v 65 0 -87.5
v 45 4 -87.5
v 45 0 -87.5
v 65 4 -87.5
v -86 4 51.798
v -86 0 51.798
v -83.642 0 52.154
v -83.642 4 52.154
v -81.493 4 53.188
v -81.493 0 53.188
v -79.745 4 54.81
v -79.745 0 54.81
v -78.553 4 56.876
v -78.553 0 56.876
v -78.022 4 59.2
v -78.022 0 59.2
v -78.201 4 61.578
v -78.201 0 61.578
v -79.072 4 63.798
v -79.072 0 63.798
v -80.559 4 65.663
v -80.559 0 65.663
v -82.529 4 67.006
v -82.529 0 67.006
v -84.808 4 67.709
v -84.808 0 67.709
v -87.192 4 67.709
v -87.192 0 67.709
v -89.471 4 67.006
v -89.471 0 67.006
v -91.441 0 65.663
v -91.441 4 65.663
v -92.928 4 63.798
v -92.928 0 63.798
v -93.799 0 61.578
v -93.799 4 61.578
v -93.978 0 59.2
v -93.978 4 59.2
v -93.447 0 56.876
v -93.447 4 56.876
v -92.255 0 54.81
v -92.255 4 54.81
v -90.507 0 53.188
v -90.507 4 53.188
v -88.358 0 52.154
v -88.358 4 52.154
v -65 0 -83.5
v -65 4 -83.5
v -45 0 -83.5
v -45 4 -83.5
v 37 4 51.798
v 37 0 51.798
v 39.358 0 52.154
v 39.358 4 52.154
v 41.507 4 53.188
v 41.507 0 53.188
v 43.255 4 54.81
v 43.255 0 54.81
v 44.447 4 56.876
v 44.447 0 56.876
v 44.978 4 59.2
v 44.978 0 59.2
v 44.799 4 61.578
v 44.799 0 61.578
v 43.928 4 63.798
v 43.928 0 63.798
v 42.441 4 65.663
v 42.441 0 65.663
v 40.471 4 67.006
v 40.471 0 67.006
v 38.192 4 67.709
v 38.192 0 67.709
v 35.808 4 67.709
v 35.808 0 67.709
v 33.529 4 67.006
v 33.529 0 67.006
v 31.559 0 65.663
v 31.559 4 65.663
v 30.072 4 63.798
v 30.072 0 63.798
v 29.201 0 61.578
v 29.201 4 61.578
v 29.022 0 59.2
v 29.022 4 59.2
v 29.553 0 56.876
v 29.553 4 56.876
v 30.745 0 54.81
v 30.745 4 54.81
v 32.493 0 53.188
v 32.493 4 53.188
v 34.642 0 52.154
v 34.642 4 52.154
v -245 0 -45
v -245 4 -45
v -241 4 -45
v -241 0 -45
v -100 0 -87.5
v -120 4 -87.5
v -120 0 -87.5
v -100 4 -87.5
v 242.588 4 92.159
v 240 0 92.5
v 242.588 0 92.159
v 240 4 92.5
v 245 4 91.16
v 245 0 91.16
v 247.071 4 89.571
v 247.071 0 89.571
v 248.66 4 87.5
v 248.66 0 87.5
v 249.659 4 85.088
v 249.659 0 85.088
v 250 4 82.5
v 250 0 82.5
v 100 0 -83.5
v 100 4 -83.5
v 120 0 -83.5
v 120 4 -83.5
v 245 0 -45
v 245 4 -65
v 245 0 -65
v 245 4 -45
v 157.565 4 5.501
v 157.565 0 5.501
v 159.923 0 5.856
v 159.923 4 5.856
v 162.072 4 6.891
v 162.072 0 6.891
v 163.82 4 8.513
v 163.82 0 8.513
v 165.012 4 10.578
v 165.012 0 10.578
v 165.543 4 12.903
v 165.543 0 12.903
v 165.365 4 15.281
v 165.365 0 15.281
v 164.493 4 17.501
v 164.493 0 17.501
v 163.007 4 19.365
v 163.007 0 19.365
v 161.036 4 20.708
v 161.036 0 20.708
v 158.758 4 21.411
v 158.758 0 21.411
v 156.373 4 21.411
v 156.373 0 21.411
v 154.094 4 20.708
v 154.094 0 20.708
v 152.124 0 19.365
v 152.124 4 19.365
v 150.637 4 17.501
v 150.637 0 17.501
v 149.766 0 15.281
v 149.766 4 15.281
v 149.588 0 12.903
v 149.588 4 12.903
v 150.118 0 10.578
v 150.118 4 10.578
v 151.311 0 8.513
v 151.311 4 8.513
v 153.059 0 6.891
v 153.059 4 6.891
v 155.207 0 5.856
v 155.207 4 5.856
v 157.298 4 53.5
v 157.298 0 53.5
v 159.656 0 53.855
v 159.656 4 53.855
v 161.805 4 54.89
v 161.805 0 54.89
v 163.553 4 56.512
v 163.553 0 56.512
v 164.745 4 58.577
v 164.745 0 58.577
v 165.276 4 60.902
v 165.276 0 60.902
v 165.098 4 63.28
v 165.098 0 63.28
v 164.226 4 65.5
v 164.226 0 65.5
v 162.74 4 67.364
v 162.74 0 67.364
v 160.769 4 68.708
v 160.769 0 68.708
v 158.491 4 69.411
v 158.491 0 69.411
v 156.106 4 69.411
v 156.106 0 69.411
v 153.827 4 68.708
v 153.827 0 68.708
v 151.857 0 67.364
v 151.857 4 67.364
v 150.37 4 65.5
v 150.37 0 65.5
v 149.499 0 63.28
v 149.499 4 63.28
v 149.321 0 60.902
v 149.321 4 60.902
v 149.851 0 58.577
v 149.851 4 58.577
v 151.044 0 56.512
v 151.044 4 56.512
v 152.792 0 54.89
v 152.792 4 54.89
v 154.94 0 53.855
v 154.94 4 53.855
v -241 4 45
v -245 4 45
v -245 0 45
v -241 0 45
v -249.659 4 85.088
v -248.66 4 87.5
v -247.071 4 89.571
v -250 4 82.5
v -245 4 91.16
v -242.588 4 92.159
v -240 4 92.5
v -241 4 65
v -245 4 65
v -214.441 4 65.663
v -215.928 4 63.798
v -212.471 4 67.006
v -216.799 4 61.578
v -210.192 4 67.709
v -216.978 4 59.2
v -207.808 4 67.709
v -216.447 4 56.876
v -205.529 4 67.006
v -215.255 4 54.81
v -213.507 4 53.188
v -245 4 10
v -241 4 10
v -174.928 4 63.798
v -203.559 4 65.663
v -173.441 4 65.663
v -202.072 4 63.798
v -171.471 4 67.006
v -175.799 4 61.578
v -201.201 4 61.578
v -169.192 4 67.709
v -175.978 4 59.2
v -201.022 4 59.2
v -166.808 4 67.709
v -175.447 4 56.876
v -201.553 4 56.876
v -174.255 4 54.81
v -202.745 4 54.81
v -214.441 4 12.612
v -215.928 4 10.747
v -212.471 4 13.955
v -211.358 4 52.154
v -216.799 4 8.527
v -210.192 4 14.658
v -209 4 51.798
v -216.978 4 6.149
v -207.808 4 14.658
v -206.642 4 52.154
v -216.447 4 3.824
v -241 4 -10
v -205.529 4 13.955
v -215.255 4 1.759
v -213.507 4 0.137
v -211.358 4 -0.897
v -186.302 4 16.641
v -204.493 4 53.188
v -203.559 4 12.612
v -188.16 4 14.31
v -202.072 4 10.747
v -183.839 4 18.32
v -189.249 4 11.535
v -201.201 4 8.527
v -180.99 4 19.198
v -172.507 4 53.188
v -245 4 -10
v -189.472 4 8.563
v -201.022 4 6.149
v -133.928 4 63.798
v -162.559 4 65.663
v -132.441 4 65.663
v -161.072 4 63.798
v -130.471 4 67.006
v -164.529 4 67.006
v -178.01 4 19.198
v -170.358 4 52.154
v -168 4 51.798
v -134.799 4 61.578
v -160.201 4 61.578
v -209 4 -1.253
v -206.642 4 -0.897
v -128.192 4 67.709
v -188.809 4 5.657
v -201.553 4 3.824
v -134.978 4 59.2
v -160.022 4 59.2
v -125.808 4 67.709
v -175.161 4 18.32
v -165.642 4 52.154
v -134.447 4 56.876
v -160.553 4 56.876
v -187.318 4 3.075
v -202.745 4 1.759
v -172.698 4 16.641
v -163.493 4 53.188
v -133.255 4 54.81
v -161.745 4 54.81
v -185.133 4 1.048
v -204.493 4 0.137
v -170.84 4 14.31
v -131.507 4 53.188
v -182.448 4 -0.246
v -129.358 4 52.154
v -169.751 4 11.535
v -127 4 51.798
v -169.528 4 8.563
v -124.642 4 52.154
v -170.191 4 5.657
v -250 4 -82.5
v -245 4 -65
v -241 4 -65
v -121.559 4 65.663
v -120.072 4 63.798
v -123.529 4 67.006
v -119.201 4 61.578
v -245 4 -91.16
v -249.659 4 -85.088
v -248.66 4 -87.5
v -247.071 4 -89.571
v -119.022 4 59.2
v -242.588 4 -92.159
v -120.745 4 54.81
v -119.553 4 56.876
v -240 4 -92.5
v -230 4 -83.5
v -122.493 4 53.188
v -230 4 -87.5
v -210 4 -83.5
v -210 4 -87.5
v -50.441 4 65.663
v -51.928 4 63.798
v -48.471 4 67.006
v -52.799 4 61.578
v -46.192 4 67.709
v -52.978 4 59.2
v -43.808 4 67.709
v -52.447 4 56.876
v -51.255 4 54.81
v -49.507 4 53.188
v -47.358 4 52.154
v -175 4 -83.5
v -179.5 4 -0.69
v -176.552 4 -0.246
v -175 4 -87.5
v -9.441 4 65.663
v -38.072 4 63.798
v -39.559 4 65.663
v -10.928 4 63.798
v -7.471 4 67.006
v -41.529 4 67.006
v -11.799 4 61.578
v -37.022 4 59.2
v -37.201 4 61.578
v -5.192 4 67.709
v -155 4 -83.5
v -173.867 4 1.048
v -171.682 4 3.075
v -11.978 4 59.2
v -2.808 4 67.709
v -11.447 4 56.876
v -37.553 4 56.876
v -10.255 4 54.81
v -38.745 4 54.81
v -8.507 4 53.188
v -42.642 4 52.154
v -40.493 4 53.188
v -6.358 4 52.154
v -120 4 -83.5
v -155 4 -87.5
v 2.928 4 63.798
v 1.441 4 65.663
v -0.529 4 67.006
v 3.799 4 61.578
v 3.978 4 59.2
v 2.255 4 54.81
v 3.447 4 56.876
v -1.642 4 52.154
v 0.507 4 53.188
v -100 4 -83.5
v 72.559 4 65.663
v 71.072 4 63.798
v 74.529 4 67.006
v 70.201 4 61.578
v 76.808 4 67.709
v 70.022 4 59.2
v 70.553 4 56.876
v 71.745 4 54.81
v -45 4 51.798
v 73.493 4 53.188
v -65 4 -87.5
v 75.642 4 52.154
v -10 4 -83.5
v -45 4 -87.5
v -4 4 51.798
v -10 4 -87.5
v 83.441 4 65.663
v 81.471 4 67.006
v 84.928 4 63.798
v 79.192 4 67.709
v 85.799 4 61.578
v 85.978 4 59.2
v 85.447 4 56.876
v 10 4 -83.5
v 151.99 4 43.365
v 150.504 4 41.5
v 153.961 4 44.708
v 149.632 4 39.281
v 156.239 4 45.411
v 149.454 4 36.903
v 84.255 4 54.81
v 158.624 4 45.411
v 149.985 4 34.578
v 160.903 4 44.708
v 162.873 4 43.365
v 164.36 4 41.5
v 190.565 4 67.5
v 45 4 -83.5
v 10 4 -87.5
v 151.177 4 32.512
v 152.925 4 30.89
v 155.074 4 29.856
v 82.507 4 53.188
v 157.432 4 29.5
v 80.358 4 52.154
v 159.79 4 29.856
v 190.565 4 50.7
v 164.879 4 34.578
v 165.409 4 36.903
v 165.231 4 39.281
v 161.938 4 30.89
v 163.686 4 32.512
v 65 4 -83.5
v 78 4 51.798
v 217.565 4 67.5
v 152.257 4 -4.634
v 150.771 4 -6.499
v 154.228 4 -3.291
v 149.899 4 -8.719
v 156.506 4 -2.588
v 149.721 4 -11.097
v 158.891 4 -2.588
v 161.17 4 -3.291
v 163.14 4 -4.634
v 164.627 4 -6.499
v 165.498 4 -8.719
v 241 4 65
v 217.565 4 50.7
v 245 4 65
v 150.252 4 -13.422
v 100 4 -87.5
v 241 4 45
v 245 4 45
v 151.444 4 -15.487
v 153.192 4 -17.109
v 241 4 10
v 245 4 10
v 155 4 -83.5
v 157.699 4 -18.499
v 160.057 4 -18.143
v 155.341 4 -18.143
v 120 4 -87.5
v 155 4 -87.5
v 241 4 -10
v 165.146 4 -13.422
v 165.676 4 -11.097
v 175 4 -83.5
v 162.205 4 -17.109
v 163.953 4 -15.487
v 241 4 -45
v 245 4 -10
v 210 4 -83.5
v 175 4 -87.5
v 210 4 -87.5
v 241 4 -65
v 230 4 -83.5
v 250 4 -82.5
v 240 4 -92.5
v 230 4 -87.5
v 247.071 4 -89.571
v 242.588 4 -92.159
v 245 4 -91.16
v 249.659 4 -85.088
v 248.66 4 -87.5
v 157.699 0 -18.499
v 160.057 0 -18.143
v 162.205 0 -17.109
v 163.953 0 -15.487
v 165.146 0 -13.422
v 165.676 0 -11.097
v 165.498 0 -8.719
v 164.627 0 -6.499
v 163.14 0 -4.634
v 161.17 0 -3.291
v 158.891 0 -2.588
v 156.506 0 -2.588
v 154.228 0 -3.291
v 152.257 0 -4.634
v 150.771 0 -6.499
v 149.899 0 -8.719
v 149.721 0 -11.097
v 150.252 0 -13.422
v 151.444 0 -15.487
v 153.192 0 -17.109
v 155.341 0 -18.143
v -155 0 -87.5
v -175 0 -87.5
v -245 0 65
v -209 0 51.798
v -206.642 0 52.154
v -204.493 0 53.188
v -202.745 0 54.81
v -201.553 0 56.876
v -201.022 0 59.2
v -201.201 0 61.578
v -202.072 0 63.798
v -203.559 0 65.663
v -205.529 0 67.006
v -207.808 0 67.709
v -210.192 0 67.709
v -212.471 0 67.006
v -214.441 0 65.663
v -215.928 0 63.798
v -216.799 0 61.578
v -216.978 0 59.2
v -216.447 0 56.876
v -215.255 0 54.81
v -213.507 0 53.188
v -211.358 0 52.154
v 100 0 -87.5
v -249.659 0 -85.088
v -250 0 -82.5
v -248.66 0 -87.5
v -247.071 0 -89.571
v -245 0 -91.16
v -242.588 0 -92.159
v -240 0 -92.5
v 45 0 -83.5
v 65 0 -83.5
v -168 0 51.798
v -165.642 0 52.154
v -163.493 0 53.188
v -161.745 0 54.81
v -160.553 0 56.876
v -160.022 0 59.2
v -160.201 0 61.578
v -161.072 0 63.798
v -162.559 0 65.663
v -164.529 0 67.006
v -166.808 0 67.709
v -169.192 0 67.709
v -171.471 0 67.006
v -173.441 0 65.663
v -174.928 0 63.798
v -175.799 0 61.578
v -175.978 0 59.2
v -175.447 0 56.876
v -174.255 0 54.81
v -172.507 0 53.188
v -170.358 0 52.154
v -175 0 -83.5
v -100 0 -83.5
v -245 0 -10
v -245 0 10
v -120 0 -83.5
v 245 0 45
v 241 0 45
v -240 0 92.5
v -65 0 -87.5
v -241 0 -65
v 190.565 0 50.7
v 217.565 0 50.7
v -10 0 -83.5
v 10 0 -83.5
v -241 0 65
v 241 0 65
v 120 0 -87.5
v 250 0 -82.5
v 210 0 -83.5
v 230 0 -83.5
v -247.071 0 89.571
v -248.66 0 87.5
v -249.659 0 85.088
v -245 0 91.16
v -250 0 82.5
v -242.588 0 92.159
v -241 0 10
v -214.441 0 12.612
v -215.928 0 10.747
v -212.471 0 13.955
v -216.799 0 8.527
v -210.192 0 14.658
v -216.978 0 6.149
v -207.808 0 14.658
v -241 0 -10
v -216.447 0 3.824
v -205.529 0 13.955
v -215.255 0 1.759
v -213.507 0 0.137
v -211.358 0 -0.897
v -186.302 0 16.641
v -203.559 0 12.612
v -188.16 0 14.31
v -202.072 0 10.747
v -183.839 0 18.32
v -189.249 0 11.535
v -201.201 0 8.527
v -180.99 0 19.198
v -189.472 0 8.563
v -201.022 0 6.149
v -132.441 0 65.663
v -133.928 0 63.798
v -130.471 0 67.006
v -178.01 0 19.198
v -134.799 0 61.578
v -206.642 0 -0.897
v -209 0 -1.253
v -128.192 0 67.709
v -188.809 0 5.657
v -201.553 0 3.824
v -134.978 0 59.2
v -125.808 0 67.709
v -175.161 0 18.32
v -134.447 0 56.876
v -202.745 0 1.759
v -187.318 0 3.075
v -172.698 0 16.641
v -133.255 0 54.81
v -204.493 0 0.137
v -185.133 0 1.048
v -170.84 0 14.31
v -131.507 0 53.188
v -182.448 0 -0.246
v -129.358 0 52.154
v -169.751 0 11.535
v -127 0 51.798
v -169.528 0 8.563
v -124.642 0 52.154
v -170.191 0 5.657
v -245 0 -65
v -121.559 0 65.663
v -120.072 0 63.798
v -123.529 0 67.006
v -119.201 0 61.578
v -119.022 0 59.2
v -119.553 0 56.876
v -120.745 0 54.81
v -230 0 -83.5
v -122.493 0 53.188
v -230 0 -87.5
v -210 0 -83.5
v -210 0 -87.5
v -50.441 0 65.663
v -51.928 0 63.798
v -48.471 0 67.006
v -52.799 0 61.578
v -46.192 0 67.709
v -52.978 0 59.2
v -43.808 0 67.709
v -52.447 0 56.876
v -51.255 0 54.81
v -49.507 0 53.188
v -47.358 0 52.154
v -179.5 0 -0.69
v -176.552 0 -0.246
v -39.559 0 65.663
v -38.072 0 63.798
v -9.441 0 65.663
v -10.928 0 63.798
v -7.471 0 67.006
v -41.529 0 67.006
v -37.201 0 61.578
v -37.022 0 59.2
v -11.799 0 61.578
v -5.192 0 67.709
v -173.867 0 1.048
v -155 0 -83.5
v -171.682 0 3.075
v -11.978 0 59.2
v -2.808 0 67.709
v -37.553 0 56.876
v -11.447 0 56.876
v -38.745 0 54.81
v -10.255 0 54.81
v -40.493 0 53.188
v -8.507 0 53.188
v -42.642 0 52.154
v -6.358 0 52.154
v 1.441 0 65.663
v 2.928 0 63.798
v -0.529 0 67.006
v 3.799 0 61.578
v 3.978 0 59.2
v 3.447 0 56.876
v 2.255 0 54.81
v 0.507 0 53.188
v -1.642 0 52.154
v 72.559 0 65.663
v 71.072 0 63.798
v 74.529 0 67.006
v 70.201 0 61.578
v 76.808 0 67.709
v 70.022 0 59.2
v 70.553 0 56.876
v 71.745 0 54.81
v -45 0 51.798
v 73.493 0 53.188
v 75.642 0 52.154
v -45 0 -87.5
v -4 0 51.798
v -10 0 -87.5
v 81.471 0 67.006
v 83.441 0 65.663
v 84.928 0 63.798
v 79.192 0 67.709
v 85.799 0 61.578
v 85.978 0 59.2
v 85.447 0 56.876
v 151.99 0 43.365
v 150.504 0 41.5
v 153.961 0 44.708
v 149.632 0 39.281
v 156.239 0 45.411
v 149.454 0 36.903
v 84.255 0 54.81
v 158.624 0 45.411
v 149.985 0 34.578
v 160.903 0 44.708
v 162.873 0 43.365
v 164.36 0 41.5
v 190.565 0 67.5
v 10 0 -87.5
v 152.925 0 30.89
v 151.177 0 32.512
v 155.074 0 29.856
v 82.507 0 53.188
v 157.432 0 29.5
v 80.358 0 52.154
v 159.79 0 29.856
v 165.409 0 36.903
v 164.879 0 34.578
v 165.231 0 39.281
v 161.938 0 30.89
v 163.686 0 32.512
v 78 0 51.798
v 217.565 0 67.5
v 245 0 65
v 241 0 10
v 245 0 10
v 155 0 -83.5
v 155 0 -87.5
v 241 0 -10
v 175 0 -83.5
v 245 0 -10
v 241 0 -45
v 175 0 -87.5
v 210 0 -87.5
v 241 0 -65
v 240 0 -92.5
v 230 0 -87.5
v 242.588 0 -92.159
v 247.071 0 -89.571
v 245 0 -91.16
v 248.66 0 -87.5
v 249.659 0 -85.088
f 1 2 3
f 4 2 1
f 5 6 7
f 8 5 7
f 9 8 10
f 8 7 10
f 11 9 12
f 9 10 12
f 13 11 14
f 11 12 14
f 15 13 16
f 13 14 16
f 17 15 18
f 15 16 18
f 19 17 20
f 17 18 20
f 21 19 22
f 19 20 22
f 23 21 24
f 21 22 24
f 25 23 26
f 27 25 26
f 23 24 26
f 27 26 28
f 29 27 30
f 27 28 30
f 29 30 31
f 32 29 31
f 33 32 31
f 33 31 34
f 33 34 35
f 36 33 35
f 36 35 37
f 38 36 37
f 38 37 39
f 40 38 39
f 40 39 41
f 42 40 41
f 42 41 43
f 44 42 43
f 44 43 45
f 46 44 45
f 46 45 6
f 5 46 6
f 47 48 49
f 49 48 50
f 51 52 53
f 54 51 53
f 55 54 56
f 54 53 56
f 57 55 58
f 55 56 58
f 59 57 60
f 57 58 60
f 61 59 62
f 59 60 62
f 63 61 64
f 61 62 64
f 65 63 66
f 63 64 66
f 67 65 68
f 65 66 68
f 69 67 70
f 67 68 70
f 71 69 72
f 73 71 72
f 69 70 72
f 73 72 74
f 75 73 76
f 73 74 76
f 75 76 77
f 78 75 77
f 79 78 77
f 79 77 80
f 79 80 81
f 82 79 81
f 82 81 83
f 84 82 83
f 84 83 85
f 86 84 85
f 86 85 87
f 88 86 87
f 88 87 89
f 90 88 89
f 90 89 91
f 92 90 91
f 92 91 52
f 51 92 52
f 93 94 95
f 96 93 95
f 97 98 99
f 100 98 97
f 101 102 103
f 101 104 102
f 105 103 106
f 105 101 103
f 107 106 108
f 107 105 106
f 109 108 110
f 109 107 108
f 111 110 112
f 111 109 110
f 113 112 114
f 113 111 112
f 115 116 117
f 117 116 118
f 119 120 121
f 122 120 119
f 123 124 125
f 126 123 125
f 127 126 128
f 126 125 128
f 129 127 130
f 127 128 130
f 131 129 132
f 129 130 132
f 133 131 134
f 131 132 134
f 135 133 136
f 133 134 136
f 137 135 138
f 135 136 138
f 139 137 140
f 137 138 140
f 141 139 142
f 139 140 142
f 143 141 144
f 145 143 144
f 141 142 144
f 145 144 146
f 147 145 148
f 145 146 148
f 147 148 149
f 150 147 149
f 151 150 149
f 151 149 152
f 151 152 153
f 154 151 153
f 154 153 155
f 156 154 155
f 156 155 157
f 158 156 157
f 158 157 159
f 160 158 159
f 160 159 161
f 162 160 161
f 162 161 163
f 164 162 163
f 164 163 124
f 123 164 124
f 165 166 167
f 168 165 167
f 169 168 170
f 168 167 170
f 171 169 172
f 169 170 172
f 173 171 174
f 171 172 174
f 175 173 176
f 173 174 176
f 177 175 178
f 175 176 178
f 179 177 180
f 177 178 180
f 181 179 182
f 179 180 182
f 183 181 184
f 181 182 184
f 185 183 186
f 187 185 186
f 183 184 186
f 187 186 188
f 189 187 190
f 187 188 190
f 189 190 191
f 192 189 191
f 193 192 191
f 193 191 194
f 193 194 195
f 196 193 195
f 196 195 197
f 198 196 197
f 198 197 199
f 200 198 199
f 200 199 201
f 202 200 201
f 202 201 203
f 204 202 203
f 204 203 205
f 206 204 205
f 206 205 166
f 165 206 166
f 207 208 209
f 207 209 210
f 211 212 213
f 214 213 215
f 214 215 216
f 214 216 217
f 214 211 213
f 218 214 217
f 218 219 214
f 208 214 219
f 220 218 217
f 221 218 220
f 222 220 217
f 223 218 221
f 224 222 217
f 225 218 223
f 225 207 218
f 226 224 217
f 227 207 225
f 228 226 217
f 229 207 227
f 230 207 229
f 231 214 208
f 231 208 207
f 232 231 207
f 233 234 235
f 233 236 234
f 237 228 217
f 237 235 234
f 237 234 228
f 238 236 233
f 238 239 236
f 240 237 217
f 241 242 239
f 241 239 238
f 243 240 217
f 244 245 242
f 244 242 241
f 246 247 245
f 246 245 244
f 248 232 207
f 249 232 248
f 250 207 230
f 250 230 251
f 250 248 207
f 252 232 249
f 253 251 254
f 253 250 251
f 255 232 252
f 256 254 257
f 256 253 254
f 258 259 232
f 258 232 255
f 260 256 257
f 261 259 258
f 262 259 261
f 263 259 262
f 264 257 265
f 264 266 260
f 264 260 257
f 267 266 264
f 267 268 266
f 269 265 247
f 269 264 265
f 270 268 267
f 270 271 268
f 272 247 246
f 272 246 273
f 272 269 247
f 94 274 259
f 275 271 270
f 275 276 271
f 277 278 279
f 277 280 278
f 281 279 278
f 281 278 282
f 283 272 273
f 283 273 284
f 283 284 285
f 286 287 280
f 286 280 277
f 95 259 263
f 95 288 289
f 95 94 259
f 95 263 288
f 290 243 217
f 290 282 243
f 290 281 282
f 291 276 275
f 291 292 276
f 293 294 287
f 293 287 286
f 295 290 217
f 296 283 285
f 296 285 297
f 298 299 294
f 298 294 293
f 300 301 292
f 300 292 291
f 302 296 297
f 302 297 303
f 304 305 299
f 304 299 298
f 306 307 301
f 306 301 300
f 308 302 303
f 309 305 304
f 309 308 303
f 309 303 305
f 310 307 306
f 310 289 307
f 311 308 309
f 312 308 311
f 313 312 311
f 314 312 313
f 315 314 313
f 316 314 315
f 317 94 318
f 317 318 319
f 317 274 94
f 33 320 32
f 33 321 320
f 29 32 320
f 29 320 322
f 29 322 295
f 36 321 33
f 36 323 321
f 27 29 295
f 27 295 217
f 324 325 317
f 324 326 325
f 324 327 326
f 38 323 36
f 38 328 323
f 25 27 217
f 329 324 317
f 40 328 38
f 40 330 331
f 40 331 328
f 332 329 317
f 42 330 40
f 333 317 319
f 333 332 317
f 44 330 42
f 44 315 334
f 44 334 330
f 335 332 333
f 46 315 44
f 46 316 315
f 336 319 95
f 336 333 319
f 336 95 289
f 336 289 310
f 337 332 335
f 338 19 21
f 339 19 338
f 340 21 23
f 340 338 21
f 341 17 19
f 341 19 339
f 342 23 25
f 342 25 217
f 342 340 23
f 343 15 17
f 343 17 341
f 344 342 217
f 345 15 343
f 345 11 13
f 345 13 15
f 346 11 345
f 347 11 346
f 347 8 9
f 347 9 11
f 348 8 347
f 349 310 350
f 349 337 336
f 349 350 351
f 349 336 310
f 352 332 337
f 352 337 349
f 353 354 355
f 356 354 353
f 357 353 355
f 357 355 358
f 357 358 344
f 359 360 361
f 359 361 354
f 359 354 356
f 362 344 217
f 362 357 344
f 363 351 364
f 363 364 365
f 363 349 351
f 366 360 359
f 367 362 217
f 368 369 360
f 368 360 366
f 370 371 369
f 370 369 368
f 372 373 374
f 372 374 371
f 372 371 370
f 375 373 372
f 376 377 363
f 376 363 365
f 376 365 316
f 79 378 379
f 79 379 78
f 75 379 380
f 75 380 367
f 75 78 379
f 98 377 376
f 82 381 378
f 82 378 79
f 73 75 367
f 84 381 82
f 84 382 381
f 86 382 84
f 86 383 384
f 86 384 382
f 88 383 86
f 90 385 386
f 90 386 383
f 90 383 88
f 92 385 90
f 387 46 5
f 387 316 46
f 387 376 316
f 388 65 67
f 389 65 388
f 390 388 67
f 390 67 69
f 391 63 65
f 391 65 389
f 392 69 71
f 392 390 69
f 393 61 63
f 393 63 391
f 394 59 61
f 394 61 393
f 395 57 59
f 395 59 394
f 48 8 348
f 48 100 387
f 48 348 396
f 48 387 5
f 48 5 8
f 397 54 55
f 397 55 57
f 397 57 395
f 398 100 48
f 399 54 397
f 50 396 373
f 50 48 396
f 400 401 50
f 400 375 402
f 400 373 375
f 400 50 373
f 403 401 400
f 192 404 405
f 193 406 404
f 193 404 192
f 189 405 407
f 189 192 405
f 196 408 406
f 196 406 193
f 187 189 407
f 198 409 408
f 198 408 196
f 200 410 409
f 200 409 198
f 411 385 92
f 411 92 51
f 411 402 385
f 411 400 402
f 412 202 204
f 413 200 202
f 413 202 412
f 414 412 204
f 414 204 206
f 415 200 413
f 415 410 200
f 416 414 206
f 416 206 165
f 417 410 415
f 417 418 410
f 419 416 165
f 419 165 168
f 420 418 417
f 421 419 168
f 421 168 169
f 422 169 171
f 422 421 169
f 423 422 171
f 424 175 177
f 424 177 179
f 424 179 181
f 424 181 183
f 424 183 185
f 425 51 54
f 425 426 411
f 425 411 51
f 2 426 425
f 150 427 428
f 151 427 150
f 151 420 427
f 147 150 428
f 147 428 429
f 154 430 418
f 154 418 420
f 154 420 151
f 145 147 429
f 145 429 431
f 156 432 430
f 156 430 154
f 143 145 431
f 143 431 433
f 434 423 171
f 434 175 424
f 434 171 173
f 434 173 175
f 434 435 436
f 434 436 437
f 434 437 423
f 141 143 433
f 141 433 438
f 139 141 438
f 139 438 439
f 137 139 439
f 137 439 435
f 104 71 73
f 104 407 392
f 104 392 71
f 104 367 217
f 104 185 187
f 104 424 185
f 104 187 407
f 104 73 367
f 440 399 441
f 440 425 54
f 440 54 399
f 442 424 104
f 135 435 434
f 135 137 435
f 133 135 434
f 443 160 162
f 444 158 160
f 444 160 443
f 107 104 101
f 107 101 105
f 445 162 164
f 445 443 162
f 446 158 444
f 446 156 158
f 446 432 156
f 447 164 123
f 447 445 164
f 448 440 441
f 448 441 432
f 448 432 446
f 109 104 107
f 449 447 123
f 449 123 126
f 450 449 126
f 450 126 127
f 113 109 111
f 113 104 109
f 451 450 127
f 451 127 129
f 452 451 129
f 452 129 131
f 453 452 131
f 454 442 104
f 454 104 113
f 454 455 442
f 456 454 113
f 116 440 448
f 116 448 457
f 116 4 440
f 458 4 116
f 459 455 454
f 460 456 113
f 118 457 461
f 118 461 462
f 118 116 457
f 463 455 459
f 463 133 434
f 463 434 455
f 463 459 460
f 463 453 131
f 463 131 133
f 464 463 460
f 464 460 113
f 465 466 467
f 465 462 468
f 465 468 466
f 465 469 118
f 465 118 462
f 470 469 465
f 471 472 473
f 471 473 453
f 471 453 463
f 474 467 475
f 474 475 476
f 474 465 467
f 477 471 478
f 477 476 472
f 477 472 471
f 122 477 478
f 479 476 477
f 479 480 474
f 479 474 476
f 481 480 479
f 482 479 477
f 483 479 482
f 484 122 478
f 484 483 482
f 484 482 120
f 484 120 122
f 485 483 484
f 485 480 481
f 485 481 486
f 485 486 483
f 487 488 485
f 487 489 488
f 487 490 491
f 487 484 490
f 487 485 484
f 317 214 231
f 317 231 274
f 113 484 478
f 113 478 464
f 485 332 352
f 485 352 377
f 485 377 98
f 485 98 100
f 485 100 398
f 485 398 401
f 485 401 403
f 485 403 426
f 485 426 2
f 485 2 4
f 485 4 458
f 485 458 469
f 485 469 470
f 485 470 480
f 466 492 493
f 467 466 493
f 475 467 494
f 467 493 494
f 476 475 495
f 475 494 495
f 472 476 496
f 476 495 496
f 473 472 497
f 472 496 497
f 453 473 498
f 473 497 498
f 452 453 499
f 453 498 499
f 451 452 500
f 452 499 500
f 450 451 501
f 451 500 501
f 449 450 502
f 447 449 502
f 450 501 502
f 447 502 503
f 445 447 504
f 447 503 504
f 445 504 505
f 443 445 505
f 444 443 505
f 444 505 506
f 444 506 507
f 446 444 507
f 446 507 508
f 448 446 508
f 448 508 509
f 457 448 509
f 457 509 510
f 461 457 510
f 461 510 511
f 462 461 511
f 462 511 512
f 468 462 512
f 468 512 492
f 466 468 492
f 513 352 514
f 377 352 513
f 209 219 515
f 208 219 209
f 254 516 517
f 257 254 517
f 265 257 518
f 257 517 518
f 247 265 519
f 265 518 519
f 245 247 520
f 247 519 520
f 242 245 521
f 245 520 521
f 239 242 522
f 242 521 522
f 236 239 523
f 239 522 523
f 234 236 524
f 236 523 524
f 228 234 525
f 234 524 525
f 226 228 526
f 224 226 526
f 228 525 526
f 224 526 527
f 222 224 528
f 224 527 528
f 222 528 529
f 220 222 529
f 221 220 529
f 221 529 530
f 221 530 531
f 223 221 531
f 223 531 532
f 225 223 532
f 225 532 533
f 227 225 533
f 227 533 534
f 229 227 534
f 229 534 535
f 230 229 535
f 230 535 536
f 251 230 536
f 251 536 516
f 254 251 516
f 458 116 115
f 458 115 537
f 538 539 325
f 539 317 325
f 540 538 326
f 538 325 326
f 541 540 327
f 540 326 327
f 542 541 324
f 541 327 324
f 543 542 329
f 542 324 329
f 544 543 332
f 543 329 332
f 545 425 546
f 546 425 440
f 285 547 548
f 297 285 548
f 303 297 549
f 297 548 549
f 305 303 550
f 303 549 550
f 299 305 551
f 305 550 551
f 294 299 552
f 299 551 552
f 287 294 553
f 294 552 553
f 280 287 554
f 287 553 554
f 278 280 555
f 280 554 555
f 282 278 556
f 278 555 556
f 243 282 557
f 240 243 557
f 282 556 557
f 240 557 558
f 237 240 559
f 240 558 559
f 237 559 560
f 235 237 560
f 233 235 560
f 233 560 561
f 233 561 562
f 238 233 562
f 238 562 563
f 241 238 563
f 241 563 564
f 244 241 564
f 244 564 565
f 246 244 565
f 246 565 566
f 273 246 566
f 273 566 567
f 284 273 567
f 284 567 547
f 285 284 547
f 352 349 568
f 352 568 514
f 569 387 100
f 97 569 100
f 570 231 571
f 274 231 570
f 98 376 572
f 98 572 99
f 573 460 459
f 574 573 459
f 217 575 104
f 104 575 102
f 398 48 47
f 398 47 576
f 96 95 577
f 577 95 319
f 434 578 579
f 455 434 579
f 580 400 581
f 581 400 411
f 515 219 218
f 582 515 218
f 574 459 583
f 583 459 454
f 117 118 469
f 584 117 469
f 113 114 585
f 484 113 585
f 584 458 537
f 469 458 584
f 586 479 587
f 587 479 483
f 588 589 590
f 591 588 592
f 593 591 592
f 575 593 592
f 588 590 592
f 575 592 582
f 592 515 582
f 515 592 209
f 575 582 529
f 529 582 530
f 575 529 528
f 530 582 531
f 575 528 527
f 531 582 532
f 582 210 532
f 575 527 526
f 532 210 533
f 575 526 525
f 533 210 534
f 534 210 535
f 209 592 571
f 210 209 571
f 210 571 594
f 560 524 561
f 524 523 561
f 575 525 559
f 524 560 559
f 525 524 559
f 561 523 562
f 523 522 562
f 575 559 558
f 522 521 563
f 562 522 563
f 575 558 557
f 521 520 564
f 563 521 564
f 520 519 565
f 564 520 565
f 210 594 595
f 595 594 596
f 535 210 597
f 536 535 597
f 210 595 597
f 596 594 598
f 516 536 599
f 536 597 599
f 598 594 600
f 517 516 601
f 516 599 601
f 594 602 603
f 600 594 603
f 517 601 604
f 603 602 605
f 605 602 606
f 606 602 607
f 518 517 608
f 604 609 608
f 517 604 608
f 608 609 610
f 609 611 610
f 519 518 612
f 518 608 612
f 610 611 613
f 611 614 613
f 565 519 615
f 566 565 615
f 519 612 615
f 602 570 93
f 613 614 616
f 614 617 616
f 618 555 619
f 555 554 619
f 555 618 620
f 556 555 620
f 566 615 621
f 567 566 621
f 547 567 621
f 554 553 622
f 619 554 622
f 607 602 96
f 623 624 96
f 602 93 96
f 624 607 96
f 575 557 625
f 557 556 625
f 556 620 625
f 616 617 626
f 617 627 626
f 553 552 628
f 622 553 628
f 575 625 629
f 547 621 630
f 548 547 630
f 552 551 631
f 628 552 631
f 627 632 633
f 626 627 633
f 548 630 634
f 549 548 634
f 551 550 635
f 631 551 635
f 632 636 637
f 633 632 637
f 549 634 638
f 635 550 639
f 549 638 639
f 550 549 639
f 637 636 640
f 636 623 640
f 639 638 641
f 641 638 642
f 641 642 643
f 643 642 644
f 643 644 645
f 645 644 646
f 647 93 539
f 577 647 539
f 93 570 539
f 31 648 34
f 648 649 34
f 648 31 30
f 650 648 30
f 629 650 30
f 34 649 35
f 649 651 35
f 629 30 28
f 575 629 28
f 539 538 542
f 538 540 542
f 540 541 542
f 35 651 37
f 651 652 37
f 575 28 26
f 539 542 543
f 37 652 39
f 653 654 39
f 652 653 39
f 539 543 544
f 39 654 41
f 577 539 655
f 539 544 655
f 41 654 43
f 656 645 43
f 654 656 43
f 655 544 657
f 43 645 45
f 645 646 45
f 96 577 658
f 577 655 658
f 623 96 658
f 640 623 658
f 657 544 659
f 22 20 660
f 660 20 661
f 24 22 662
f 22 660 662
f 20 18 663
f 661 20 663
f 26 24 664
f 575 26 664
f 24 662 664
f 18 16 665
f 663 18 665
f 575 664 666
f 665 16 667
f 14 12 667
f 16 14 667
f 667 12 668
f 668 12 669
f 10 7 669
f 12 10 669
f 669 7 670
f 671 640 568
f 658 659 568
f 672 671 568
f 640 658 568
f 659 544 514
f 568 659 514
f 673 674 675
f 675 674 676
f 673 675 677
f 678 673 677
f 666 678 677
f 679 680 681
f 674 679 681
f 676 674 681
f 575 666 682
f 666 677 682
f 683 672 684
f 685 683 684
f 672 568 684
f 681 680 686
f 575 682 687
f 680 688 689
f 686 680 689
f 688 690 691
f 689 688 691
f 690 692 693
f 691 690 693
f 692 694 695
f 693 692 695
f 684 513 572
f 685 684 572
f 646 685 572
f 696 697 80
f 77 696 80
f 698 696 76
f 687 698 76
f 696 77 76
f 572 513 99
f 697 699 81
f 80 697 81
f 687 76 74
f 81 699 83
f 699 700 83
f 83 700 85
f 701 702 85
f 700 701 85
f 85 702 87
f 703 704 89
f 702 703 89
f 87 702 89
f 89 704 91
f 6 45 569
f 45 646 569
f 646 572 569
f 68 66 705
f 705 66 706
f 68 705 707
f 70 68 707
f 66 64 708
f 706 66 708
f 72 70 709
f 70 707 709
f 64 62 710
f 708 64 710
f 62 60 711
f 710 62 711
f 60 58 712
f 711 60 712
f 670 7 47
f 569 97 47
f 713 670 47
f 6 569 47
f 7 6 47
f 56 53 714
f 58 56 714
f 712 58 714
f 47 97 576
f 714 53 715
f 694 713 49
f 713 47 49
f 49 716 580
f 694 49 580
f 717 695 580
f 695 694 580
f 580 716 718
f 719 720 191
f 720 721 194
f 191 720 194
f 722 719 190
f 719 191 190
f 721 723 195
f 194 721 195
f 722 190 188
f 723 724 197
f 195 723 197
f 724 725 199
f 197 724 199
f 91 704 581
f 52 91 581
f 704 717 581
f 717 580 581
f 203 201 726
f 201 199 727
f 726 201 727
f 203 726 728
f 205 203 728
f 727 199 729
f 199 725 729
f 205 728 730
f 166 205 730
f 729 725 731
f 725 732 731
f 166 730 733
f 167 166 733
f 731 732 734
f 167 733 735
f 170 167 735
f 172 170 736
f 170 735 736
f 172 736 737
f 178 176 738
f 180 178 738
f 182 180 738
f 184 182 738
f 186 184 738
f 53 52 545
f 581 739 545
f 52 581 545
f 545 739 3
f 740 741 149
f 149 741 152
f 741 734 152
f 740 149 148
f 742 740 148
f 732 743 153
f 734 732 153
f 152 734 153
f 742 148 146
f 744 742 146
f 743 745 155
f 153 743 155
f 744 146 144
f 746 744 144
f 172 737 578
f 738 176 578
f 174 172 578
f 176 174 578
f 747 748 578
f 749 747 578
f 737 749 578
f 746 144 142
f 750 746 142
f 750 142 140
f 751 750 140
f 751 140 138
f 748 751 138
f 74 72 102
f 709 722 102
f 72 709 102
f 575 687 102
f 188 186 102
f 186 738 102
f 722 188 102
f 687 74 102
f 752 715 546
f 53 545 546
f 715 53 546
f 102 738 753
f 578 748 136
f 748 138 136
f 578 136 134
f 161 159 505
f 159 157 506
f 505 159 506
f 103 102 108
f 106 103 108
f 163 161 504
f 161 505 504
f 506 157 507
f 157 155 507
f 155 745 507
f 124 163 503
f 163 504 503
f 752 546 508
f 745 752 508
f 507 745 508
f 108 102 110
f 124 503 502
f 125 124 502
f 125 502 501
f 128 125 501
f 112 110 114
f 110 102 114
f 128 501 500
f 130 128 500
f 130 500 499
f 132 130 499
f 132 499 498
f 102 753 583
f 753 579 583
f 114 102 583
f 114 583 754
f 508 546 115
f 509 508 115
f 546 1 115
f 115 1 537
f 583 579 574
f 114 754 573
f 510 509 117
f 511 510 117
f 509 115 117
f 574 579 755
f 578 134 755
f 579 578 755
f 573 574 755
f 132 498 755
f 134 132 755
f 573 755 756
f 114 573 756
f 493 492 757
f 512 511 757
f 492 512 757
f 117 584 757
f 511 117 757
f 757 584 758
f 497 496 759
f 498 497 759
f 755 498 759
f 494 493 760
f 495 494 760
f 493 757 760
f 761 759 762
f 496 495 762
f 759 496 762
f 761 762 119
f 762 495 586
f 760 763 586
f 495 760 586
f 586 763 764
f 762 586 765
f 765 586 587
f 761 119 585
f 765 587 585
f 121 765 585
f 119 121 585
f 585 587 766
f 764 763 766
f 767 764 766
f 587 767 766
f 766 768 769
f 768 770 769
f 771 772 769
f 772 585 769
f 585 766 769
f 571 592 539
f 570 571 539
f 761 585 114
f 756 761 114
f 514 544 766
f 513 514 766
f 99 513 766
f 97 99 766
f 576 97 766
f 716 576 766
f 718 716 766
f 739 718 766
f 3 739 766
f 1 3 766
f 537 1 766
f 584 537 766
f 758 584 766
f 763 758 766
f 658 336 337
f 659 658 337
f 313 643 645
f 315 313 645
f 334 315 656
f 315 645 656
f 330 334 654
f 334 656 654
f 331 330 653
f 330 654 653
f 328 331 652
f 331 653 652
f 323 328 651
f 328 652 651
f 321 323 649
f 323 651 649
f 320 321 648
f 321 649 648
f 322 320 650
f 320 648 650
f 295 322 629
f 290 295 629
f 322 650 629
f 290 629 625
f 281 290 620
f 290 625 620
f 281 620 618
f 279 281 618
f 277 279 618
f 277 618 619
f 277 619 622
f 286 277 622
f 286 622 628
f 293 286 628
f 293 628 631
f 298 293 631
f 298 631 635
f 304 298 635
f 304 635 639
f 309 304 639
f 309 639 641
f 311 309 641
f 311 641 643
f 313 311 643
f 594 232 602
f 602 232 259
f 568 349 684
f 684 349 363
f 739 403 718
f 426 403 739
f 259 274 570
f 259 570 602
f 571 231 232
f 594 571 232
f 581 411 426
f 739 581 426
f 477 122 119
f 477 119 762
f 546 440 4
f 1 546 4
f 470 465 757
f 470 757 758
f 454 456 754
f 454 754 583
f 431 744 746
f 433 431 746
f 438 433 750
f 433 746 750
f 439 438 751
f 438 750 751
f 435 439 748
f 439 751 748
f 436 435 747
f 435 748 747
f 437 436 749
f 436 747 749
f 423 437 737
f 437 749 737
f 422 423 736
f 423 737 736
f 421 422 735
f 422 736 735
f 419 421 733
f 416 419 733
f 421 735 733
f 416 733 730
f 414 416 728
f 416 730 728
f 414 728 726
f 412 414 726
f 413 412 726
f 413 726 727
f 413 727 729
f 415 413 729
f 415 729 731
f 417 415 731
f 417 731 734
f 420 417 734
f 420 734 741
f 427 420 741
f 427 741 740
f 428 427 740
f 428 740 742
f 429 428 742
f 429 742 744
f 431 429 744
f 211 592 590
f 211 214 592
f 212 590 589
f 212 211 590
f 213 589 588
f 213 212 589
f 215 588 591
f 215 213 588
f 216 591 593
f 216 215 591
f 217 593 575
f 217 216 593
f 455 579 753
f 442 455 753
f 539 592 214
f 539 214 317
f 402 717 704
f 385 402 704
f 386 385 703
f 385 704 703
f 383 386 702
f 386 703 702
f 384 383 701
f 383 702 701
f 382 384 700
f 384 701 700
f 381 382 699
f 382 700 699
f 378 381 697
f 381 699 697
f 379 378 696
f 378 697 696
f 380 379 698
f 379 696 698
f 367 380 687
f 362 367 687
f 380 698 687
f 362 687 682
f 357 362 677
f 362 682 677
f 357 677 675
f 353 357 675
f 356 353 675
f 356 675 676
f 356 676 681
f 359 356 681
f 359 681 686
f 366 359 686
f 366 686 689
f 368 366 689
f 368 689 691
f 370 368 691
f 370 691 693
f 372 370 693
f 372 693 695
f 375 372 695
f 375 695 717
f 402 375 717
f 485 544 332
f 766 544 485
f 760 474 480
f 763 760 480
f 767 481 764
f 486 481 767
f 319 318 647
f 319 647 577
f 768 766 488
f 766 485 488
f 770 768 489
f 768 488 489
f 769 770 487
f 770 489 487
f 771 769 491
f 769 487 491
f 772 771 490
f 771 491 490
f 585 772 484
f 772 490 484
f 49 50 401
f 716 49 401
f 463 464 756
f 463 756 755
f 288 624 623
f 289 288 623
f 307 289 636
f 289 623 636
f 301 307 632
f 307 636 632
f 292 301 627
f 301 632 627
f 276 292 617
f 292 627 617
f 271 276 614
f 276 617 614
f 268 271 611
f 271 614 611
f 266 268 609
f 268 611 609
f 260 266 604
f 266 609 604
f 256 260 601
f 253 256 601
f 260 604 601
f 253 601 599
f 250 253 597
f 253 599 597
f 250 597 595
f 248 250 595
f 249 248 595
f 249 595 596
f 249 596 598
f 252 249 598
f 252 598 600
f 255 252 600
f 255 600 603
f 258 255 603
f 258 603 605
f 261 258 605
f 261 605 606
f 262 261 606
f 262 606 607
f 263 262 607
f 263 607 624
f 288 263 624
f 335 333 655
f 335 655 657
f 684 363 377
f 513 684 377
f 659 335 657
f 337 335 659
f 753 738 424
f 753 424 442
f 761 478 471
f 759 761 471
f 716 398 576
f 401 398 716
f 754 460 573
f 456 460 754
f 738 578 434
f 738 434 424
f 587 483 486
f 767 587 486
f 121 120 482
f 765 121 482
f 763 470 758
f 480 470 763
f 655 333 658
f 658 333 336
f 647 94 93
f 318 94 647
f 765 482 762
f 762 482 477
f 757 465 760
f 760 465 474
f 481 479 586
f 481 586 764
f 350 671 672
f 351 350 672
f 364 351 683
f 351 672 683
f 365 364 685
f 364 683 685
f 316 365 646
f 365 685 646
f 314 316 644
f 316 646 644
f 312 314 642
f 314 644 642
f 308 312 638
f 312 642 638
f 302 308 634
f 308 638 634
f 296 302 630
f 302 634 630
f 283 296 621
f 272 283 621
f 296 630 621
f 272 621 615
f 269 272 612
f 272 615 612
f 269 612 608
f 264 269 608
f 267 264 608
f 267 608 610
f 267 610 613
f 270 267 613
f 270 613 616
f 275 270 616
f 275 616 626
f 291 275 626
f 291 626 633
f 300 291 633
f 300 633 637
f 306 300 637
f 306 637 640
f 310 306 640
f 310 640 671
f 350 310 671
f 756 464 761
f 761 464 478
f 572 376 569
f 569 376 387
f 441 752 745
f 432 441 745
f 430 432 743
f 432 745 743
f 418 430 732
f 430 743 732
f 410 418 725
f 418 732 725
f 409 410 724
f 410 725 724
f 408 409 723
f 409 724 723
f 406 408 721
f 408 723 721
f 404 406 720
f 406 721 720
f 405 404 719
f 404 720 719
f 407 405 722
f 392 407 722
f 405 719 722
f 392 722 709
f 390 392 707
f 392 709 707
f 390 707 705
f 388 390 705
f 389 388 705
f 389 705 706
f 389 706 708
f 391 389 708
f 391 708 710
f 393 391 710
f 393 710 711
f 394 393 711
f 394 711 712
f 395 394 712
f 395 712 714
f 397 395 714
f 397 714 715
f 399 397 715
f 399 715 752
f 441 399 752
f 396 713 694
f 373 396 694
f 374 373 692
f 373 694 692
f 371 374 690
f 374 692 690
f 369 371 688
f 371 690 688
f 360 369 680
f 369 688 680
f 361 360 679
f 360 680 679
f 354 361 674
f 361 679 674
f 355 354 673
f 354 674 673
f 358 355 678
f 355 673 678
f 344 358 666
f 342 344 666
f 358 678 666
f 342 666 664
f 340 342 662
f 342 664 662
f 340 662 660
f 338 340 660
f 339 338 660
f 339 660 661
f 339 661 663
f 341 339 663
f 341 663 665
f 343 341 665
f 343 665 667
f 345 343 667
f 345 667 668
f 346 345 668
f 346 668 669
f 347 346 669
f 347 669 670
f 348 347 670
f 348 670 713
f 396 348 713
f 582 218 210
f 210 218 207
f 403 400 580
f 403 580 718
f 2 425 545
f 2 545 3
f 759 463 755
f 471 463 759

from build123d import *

# Parameters (mm, degrees)
SKETCH2_W                   = 500
SKETCH2_H                   = 185
BASE_DEPTH                  = 4
SKETCH3_W                   = 20
SKETCH3_H                   = 4
TOP_HOLE_DEFINITION_DEPTH   = 267.593792126
TOP_HOLE_PATTERN_COUNT      = 5
TOP_HOLE_PATTERN_PITCH      = 55
TOP_HOLE_PATTERN_COL_COUNT  = 5
TOP_HOLE_PATTERN_COL_PITCH  = 55
SKETCH4_W                   = 4
SKETCH4_H                   = 20
LEFT_HOLE_DEFINITION_DEPTH  = 267.593792126
LEFT_HOLE_PATTERN_COUNT     = 2
LEFT_HOLE_PATTERN_PITCH     = 55
LEFT_HOLE_PATTERN_COL_COUNT = 2
LEFT_HOLE_PATTERN_COL_PITCH = 55
FILLET1_R                   = 10
MIRROR2_COPY_1_SKETCH_W     = 4
MIRROR2_COPY_1_SKETCH_H     = 20
MIRROR2_COPY_1_DEPTH        = 267.593792126
MIRROR2_COPY_2_SKETCH_W     = 4
MIRROR2_COPY_2_SKETCH_H     = 20
MIRROR2_COPY_2_DEPTH        = 267.593792126
SKETCH7_R                   = 8
SKETCH7_R_2                 = 10
CUT_EXTRUDE5_DEPTH          = 267.593792126
SKETCH8_W                   = 27
SKETCH8_H                   = 16.8
CUT_EXTRUDE6_DEPTH          = 267.593792126


with BuildPart() as part:
    # Sketch2 → Base (new body)
    with BuildSketch(Plane(origin=(0, 0, 0), x_dir=(1, 0, 0), z_dir=(0, 1, 0))):
        Rectangle(SKETCH2_W, SKETCH2_H)
    extrude(amount=BASE_DEPTH)

    # Sketch3 → Top Hole Definition (cut, through all)
    with BuildSketch(Plane(origin=(0, 4, 0), x_dir=(1, 0, 0), z_dir=(0, 1, 0))):
        with Locations((0, 85.5)):
            Rectangle(SKETCH3_W, SKETCH3_H)
    top_hole_definition = extrude(amount=-TOP_HOLE_DEFINITION_DEPTH, mode=Mode.SUBTRACT)

    # Top Hole Pattern: Top Hole Definition ×5
    with Locations(*[(-i * TOP_HOLE_PATTERN_PITCH, 0, 0) for i in range(1, TOP_HOLE_PATTERN_COUNT)]):
        add(top_hole_definition, mode=Mode.SUBTRACT)

    # Top Hole Pattern col: Top Hole Definition ×5
    with Locations(*[(i * TOP_HOLE_PATTERN_COL_PITCH, 0, 0) for i in range(1, TOP_HOLE_PATTERN_COL_COUNT)]):
        add(top_hole_definition, mode=Mode.SUBTRACT)

    # Sketch4 → Left Hole Definition (cut, through all)
    with BuildSketch(Plane(origin=(0, 4, 0), x_dir=(1, 0, 0), z_dir=(0, 1, 0))):
        with Locations((-243, 0)):
            Rectangle(SKETCH4_W, SKETCH4_H)
    left_hole_definition = extrude(amount=-LEFT_HOLE_DEFINITION_DEPTH, mode=Mode.SUBTRACT)

    # Left Hole Pattern: Left Hole Definition ×2
    with Locations(*[(0, 0, -i * LEFT_HOLE_PATTERN_PITCH) for i in range(1, LEFT_HOLE_PATTERN_COUNT)]):
        add(left_hole_definition, mode=Mode.SUBTRACT)

    # Left Hole Pattern col: Left Hole Definition ×2
    with Locations(*[(0, 0, i * LEFT_HOLE_PATTERN_COL_PITCH) for i in range(1, LEFT_HOLE_PATTERN_COL_COUNT)]):
        add(left_hole_definition, mode=Mode.SUBTRACT)

    # Fillet1
    fillet1_edges = [part.edges().sort_by_distance(p)[0] for p in [
        (-250, 2, -92.5),
        (250, 2, -92.5),
        (250, 2, 92.5),
        (-250, 2, 92.5),
    ]]
    fillet(fillet1_edges, radius=FILLET1_R)

    # Mirror2: Left Hole Definition across plane
    add(left_hole_definition.mirror(Plane(origin=(0, 0, 0), x_dir=(0, 0, 1), z_dir=(1, 0, 0))), mode=Mode.SUBTRACT)

    # Mirror2 copy 1 sketch → Mirror2 copy 1 (cut, through all)
    with BuildSketch(Plane(origin=(0, 4, -55), x_dir=(-1, 0, 0), z_dir=(0, 1, 0))):
        with Locations((-243, 0)):
            Rectangle(MIRROR2_COPY_1_SKETCH_W, MIRROR2_COPY_1_SKETCH_H)
    extrude(amount=-MIRROR2_COPY_1_DEPTH, mode=Mode.SUBTRACT)

    # Mirror2 copy 2 sketch → Mirror2 copy 2 (cut, through all)
    with BuildSketch(Plane(origin=(0, 4, 55), x_dir=(-1, 0, 0), z_dir=(0, 1, 0))):
        with Locations((-243, 0)):
            Rectangle(MIRROR2_COPY_2_SKETCH_W, MIRROR2_COPY_2_SKETCH_H)
    extrude(amount=-MIRROR2_COPY_2_DEPTH, mode=Mode.SUBTRACT)

    # Sketch7 → Cut-Extrude5 (cut, through all)
    with BuildSketch(Plane.XZ):
        with Locations(Location((-209, 59.798294078, 0), (0, 0, 270))):
            Circle(SKETCH7_R)
        with Locations(Location((-168, 59.798294078, 0), (0, 0, 270))):
            Circle(SKETCH7_R)
        with Locations(Location((-127, 59.798294078, 0), (0, 0, 270))):
            Circle(SKETCH7_R)
        with Locations(Location((-86, 59.798294078, 0), (0, 0, 270))):
            Circle(SKETCH7_R)
        with Locations(Location((-45, 59.798294078, 0), (0, 0, 270))):
            Circle(SKETCH7_R)
        with Locations(Location((-4, 59.798294078, 0), (0, 0, 270))):
            Circle(SKETCH7_R)
        with Locations(Location((37, 59.798294078, 0), (0, 0, 270))):
            Circle(SKETCH7_R)
        with Locations(Location((78, 59.798294078, 0), (0, 0, 270))):
            Circle(SKETCH7_R)
        with Locations(Location((-179.5, 9.310158007, 0), (0, 0, 270))):
            Circle(SKETCH7_R_2)
        with Locations(Location((-209, 6.747125767, 0), (0, 0, 270))):
            Circle(SKETCH7_R)
        with Locations(Location((157.298294078, 61.5, 0), (0, 0, 270))):
            Circle(SKETCH7_R)
        with Locations(Location((157.431778922, 37.500371215, 0), (0, 0, 270))):
            Circle(SKETCH7_R)
        with Locations(Location((157.565263767, 13.500742431, 0), (0, 0, 270))):
            Circle(SKETCH7_R)
        with Locations(Location((157.698748611, -10.498886354, 0), (0, 0, 270))):
            Circle(SKETCH7_R)
    extrude(amount=-CUT_EXTRUDE5_DEPTH, mode=Mode.SUBTRACT)

    # Sketch8 → Cut-Extrude6 (cut, through all)
    with BuildSketch(Plane.XZ):
        with Locations((204.065263766, 59.1)):
            Rectangle(SKETCH8_W, SKETCH8_H)
    extrude(amount=-CUT_EXTRUDE6_DEPTH, mode=Mode.SUBTRACT)


solid = part.part
